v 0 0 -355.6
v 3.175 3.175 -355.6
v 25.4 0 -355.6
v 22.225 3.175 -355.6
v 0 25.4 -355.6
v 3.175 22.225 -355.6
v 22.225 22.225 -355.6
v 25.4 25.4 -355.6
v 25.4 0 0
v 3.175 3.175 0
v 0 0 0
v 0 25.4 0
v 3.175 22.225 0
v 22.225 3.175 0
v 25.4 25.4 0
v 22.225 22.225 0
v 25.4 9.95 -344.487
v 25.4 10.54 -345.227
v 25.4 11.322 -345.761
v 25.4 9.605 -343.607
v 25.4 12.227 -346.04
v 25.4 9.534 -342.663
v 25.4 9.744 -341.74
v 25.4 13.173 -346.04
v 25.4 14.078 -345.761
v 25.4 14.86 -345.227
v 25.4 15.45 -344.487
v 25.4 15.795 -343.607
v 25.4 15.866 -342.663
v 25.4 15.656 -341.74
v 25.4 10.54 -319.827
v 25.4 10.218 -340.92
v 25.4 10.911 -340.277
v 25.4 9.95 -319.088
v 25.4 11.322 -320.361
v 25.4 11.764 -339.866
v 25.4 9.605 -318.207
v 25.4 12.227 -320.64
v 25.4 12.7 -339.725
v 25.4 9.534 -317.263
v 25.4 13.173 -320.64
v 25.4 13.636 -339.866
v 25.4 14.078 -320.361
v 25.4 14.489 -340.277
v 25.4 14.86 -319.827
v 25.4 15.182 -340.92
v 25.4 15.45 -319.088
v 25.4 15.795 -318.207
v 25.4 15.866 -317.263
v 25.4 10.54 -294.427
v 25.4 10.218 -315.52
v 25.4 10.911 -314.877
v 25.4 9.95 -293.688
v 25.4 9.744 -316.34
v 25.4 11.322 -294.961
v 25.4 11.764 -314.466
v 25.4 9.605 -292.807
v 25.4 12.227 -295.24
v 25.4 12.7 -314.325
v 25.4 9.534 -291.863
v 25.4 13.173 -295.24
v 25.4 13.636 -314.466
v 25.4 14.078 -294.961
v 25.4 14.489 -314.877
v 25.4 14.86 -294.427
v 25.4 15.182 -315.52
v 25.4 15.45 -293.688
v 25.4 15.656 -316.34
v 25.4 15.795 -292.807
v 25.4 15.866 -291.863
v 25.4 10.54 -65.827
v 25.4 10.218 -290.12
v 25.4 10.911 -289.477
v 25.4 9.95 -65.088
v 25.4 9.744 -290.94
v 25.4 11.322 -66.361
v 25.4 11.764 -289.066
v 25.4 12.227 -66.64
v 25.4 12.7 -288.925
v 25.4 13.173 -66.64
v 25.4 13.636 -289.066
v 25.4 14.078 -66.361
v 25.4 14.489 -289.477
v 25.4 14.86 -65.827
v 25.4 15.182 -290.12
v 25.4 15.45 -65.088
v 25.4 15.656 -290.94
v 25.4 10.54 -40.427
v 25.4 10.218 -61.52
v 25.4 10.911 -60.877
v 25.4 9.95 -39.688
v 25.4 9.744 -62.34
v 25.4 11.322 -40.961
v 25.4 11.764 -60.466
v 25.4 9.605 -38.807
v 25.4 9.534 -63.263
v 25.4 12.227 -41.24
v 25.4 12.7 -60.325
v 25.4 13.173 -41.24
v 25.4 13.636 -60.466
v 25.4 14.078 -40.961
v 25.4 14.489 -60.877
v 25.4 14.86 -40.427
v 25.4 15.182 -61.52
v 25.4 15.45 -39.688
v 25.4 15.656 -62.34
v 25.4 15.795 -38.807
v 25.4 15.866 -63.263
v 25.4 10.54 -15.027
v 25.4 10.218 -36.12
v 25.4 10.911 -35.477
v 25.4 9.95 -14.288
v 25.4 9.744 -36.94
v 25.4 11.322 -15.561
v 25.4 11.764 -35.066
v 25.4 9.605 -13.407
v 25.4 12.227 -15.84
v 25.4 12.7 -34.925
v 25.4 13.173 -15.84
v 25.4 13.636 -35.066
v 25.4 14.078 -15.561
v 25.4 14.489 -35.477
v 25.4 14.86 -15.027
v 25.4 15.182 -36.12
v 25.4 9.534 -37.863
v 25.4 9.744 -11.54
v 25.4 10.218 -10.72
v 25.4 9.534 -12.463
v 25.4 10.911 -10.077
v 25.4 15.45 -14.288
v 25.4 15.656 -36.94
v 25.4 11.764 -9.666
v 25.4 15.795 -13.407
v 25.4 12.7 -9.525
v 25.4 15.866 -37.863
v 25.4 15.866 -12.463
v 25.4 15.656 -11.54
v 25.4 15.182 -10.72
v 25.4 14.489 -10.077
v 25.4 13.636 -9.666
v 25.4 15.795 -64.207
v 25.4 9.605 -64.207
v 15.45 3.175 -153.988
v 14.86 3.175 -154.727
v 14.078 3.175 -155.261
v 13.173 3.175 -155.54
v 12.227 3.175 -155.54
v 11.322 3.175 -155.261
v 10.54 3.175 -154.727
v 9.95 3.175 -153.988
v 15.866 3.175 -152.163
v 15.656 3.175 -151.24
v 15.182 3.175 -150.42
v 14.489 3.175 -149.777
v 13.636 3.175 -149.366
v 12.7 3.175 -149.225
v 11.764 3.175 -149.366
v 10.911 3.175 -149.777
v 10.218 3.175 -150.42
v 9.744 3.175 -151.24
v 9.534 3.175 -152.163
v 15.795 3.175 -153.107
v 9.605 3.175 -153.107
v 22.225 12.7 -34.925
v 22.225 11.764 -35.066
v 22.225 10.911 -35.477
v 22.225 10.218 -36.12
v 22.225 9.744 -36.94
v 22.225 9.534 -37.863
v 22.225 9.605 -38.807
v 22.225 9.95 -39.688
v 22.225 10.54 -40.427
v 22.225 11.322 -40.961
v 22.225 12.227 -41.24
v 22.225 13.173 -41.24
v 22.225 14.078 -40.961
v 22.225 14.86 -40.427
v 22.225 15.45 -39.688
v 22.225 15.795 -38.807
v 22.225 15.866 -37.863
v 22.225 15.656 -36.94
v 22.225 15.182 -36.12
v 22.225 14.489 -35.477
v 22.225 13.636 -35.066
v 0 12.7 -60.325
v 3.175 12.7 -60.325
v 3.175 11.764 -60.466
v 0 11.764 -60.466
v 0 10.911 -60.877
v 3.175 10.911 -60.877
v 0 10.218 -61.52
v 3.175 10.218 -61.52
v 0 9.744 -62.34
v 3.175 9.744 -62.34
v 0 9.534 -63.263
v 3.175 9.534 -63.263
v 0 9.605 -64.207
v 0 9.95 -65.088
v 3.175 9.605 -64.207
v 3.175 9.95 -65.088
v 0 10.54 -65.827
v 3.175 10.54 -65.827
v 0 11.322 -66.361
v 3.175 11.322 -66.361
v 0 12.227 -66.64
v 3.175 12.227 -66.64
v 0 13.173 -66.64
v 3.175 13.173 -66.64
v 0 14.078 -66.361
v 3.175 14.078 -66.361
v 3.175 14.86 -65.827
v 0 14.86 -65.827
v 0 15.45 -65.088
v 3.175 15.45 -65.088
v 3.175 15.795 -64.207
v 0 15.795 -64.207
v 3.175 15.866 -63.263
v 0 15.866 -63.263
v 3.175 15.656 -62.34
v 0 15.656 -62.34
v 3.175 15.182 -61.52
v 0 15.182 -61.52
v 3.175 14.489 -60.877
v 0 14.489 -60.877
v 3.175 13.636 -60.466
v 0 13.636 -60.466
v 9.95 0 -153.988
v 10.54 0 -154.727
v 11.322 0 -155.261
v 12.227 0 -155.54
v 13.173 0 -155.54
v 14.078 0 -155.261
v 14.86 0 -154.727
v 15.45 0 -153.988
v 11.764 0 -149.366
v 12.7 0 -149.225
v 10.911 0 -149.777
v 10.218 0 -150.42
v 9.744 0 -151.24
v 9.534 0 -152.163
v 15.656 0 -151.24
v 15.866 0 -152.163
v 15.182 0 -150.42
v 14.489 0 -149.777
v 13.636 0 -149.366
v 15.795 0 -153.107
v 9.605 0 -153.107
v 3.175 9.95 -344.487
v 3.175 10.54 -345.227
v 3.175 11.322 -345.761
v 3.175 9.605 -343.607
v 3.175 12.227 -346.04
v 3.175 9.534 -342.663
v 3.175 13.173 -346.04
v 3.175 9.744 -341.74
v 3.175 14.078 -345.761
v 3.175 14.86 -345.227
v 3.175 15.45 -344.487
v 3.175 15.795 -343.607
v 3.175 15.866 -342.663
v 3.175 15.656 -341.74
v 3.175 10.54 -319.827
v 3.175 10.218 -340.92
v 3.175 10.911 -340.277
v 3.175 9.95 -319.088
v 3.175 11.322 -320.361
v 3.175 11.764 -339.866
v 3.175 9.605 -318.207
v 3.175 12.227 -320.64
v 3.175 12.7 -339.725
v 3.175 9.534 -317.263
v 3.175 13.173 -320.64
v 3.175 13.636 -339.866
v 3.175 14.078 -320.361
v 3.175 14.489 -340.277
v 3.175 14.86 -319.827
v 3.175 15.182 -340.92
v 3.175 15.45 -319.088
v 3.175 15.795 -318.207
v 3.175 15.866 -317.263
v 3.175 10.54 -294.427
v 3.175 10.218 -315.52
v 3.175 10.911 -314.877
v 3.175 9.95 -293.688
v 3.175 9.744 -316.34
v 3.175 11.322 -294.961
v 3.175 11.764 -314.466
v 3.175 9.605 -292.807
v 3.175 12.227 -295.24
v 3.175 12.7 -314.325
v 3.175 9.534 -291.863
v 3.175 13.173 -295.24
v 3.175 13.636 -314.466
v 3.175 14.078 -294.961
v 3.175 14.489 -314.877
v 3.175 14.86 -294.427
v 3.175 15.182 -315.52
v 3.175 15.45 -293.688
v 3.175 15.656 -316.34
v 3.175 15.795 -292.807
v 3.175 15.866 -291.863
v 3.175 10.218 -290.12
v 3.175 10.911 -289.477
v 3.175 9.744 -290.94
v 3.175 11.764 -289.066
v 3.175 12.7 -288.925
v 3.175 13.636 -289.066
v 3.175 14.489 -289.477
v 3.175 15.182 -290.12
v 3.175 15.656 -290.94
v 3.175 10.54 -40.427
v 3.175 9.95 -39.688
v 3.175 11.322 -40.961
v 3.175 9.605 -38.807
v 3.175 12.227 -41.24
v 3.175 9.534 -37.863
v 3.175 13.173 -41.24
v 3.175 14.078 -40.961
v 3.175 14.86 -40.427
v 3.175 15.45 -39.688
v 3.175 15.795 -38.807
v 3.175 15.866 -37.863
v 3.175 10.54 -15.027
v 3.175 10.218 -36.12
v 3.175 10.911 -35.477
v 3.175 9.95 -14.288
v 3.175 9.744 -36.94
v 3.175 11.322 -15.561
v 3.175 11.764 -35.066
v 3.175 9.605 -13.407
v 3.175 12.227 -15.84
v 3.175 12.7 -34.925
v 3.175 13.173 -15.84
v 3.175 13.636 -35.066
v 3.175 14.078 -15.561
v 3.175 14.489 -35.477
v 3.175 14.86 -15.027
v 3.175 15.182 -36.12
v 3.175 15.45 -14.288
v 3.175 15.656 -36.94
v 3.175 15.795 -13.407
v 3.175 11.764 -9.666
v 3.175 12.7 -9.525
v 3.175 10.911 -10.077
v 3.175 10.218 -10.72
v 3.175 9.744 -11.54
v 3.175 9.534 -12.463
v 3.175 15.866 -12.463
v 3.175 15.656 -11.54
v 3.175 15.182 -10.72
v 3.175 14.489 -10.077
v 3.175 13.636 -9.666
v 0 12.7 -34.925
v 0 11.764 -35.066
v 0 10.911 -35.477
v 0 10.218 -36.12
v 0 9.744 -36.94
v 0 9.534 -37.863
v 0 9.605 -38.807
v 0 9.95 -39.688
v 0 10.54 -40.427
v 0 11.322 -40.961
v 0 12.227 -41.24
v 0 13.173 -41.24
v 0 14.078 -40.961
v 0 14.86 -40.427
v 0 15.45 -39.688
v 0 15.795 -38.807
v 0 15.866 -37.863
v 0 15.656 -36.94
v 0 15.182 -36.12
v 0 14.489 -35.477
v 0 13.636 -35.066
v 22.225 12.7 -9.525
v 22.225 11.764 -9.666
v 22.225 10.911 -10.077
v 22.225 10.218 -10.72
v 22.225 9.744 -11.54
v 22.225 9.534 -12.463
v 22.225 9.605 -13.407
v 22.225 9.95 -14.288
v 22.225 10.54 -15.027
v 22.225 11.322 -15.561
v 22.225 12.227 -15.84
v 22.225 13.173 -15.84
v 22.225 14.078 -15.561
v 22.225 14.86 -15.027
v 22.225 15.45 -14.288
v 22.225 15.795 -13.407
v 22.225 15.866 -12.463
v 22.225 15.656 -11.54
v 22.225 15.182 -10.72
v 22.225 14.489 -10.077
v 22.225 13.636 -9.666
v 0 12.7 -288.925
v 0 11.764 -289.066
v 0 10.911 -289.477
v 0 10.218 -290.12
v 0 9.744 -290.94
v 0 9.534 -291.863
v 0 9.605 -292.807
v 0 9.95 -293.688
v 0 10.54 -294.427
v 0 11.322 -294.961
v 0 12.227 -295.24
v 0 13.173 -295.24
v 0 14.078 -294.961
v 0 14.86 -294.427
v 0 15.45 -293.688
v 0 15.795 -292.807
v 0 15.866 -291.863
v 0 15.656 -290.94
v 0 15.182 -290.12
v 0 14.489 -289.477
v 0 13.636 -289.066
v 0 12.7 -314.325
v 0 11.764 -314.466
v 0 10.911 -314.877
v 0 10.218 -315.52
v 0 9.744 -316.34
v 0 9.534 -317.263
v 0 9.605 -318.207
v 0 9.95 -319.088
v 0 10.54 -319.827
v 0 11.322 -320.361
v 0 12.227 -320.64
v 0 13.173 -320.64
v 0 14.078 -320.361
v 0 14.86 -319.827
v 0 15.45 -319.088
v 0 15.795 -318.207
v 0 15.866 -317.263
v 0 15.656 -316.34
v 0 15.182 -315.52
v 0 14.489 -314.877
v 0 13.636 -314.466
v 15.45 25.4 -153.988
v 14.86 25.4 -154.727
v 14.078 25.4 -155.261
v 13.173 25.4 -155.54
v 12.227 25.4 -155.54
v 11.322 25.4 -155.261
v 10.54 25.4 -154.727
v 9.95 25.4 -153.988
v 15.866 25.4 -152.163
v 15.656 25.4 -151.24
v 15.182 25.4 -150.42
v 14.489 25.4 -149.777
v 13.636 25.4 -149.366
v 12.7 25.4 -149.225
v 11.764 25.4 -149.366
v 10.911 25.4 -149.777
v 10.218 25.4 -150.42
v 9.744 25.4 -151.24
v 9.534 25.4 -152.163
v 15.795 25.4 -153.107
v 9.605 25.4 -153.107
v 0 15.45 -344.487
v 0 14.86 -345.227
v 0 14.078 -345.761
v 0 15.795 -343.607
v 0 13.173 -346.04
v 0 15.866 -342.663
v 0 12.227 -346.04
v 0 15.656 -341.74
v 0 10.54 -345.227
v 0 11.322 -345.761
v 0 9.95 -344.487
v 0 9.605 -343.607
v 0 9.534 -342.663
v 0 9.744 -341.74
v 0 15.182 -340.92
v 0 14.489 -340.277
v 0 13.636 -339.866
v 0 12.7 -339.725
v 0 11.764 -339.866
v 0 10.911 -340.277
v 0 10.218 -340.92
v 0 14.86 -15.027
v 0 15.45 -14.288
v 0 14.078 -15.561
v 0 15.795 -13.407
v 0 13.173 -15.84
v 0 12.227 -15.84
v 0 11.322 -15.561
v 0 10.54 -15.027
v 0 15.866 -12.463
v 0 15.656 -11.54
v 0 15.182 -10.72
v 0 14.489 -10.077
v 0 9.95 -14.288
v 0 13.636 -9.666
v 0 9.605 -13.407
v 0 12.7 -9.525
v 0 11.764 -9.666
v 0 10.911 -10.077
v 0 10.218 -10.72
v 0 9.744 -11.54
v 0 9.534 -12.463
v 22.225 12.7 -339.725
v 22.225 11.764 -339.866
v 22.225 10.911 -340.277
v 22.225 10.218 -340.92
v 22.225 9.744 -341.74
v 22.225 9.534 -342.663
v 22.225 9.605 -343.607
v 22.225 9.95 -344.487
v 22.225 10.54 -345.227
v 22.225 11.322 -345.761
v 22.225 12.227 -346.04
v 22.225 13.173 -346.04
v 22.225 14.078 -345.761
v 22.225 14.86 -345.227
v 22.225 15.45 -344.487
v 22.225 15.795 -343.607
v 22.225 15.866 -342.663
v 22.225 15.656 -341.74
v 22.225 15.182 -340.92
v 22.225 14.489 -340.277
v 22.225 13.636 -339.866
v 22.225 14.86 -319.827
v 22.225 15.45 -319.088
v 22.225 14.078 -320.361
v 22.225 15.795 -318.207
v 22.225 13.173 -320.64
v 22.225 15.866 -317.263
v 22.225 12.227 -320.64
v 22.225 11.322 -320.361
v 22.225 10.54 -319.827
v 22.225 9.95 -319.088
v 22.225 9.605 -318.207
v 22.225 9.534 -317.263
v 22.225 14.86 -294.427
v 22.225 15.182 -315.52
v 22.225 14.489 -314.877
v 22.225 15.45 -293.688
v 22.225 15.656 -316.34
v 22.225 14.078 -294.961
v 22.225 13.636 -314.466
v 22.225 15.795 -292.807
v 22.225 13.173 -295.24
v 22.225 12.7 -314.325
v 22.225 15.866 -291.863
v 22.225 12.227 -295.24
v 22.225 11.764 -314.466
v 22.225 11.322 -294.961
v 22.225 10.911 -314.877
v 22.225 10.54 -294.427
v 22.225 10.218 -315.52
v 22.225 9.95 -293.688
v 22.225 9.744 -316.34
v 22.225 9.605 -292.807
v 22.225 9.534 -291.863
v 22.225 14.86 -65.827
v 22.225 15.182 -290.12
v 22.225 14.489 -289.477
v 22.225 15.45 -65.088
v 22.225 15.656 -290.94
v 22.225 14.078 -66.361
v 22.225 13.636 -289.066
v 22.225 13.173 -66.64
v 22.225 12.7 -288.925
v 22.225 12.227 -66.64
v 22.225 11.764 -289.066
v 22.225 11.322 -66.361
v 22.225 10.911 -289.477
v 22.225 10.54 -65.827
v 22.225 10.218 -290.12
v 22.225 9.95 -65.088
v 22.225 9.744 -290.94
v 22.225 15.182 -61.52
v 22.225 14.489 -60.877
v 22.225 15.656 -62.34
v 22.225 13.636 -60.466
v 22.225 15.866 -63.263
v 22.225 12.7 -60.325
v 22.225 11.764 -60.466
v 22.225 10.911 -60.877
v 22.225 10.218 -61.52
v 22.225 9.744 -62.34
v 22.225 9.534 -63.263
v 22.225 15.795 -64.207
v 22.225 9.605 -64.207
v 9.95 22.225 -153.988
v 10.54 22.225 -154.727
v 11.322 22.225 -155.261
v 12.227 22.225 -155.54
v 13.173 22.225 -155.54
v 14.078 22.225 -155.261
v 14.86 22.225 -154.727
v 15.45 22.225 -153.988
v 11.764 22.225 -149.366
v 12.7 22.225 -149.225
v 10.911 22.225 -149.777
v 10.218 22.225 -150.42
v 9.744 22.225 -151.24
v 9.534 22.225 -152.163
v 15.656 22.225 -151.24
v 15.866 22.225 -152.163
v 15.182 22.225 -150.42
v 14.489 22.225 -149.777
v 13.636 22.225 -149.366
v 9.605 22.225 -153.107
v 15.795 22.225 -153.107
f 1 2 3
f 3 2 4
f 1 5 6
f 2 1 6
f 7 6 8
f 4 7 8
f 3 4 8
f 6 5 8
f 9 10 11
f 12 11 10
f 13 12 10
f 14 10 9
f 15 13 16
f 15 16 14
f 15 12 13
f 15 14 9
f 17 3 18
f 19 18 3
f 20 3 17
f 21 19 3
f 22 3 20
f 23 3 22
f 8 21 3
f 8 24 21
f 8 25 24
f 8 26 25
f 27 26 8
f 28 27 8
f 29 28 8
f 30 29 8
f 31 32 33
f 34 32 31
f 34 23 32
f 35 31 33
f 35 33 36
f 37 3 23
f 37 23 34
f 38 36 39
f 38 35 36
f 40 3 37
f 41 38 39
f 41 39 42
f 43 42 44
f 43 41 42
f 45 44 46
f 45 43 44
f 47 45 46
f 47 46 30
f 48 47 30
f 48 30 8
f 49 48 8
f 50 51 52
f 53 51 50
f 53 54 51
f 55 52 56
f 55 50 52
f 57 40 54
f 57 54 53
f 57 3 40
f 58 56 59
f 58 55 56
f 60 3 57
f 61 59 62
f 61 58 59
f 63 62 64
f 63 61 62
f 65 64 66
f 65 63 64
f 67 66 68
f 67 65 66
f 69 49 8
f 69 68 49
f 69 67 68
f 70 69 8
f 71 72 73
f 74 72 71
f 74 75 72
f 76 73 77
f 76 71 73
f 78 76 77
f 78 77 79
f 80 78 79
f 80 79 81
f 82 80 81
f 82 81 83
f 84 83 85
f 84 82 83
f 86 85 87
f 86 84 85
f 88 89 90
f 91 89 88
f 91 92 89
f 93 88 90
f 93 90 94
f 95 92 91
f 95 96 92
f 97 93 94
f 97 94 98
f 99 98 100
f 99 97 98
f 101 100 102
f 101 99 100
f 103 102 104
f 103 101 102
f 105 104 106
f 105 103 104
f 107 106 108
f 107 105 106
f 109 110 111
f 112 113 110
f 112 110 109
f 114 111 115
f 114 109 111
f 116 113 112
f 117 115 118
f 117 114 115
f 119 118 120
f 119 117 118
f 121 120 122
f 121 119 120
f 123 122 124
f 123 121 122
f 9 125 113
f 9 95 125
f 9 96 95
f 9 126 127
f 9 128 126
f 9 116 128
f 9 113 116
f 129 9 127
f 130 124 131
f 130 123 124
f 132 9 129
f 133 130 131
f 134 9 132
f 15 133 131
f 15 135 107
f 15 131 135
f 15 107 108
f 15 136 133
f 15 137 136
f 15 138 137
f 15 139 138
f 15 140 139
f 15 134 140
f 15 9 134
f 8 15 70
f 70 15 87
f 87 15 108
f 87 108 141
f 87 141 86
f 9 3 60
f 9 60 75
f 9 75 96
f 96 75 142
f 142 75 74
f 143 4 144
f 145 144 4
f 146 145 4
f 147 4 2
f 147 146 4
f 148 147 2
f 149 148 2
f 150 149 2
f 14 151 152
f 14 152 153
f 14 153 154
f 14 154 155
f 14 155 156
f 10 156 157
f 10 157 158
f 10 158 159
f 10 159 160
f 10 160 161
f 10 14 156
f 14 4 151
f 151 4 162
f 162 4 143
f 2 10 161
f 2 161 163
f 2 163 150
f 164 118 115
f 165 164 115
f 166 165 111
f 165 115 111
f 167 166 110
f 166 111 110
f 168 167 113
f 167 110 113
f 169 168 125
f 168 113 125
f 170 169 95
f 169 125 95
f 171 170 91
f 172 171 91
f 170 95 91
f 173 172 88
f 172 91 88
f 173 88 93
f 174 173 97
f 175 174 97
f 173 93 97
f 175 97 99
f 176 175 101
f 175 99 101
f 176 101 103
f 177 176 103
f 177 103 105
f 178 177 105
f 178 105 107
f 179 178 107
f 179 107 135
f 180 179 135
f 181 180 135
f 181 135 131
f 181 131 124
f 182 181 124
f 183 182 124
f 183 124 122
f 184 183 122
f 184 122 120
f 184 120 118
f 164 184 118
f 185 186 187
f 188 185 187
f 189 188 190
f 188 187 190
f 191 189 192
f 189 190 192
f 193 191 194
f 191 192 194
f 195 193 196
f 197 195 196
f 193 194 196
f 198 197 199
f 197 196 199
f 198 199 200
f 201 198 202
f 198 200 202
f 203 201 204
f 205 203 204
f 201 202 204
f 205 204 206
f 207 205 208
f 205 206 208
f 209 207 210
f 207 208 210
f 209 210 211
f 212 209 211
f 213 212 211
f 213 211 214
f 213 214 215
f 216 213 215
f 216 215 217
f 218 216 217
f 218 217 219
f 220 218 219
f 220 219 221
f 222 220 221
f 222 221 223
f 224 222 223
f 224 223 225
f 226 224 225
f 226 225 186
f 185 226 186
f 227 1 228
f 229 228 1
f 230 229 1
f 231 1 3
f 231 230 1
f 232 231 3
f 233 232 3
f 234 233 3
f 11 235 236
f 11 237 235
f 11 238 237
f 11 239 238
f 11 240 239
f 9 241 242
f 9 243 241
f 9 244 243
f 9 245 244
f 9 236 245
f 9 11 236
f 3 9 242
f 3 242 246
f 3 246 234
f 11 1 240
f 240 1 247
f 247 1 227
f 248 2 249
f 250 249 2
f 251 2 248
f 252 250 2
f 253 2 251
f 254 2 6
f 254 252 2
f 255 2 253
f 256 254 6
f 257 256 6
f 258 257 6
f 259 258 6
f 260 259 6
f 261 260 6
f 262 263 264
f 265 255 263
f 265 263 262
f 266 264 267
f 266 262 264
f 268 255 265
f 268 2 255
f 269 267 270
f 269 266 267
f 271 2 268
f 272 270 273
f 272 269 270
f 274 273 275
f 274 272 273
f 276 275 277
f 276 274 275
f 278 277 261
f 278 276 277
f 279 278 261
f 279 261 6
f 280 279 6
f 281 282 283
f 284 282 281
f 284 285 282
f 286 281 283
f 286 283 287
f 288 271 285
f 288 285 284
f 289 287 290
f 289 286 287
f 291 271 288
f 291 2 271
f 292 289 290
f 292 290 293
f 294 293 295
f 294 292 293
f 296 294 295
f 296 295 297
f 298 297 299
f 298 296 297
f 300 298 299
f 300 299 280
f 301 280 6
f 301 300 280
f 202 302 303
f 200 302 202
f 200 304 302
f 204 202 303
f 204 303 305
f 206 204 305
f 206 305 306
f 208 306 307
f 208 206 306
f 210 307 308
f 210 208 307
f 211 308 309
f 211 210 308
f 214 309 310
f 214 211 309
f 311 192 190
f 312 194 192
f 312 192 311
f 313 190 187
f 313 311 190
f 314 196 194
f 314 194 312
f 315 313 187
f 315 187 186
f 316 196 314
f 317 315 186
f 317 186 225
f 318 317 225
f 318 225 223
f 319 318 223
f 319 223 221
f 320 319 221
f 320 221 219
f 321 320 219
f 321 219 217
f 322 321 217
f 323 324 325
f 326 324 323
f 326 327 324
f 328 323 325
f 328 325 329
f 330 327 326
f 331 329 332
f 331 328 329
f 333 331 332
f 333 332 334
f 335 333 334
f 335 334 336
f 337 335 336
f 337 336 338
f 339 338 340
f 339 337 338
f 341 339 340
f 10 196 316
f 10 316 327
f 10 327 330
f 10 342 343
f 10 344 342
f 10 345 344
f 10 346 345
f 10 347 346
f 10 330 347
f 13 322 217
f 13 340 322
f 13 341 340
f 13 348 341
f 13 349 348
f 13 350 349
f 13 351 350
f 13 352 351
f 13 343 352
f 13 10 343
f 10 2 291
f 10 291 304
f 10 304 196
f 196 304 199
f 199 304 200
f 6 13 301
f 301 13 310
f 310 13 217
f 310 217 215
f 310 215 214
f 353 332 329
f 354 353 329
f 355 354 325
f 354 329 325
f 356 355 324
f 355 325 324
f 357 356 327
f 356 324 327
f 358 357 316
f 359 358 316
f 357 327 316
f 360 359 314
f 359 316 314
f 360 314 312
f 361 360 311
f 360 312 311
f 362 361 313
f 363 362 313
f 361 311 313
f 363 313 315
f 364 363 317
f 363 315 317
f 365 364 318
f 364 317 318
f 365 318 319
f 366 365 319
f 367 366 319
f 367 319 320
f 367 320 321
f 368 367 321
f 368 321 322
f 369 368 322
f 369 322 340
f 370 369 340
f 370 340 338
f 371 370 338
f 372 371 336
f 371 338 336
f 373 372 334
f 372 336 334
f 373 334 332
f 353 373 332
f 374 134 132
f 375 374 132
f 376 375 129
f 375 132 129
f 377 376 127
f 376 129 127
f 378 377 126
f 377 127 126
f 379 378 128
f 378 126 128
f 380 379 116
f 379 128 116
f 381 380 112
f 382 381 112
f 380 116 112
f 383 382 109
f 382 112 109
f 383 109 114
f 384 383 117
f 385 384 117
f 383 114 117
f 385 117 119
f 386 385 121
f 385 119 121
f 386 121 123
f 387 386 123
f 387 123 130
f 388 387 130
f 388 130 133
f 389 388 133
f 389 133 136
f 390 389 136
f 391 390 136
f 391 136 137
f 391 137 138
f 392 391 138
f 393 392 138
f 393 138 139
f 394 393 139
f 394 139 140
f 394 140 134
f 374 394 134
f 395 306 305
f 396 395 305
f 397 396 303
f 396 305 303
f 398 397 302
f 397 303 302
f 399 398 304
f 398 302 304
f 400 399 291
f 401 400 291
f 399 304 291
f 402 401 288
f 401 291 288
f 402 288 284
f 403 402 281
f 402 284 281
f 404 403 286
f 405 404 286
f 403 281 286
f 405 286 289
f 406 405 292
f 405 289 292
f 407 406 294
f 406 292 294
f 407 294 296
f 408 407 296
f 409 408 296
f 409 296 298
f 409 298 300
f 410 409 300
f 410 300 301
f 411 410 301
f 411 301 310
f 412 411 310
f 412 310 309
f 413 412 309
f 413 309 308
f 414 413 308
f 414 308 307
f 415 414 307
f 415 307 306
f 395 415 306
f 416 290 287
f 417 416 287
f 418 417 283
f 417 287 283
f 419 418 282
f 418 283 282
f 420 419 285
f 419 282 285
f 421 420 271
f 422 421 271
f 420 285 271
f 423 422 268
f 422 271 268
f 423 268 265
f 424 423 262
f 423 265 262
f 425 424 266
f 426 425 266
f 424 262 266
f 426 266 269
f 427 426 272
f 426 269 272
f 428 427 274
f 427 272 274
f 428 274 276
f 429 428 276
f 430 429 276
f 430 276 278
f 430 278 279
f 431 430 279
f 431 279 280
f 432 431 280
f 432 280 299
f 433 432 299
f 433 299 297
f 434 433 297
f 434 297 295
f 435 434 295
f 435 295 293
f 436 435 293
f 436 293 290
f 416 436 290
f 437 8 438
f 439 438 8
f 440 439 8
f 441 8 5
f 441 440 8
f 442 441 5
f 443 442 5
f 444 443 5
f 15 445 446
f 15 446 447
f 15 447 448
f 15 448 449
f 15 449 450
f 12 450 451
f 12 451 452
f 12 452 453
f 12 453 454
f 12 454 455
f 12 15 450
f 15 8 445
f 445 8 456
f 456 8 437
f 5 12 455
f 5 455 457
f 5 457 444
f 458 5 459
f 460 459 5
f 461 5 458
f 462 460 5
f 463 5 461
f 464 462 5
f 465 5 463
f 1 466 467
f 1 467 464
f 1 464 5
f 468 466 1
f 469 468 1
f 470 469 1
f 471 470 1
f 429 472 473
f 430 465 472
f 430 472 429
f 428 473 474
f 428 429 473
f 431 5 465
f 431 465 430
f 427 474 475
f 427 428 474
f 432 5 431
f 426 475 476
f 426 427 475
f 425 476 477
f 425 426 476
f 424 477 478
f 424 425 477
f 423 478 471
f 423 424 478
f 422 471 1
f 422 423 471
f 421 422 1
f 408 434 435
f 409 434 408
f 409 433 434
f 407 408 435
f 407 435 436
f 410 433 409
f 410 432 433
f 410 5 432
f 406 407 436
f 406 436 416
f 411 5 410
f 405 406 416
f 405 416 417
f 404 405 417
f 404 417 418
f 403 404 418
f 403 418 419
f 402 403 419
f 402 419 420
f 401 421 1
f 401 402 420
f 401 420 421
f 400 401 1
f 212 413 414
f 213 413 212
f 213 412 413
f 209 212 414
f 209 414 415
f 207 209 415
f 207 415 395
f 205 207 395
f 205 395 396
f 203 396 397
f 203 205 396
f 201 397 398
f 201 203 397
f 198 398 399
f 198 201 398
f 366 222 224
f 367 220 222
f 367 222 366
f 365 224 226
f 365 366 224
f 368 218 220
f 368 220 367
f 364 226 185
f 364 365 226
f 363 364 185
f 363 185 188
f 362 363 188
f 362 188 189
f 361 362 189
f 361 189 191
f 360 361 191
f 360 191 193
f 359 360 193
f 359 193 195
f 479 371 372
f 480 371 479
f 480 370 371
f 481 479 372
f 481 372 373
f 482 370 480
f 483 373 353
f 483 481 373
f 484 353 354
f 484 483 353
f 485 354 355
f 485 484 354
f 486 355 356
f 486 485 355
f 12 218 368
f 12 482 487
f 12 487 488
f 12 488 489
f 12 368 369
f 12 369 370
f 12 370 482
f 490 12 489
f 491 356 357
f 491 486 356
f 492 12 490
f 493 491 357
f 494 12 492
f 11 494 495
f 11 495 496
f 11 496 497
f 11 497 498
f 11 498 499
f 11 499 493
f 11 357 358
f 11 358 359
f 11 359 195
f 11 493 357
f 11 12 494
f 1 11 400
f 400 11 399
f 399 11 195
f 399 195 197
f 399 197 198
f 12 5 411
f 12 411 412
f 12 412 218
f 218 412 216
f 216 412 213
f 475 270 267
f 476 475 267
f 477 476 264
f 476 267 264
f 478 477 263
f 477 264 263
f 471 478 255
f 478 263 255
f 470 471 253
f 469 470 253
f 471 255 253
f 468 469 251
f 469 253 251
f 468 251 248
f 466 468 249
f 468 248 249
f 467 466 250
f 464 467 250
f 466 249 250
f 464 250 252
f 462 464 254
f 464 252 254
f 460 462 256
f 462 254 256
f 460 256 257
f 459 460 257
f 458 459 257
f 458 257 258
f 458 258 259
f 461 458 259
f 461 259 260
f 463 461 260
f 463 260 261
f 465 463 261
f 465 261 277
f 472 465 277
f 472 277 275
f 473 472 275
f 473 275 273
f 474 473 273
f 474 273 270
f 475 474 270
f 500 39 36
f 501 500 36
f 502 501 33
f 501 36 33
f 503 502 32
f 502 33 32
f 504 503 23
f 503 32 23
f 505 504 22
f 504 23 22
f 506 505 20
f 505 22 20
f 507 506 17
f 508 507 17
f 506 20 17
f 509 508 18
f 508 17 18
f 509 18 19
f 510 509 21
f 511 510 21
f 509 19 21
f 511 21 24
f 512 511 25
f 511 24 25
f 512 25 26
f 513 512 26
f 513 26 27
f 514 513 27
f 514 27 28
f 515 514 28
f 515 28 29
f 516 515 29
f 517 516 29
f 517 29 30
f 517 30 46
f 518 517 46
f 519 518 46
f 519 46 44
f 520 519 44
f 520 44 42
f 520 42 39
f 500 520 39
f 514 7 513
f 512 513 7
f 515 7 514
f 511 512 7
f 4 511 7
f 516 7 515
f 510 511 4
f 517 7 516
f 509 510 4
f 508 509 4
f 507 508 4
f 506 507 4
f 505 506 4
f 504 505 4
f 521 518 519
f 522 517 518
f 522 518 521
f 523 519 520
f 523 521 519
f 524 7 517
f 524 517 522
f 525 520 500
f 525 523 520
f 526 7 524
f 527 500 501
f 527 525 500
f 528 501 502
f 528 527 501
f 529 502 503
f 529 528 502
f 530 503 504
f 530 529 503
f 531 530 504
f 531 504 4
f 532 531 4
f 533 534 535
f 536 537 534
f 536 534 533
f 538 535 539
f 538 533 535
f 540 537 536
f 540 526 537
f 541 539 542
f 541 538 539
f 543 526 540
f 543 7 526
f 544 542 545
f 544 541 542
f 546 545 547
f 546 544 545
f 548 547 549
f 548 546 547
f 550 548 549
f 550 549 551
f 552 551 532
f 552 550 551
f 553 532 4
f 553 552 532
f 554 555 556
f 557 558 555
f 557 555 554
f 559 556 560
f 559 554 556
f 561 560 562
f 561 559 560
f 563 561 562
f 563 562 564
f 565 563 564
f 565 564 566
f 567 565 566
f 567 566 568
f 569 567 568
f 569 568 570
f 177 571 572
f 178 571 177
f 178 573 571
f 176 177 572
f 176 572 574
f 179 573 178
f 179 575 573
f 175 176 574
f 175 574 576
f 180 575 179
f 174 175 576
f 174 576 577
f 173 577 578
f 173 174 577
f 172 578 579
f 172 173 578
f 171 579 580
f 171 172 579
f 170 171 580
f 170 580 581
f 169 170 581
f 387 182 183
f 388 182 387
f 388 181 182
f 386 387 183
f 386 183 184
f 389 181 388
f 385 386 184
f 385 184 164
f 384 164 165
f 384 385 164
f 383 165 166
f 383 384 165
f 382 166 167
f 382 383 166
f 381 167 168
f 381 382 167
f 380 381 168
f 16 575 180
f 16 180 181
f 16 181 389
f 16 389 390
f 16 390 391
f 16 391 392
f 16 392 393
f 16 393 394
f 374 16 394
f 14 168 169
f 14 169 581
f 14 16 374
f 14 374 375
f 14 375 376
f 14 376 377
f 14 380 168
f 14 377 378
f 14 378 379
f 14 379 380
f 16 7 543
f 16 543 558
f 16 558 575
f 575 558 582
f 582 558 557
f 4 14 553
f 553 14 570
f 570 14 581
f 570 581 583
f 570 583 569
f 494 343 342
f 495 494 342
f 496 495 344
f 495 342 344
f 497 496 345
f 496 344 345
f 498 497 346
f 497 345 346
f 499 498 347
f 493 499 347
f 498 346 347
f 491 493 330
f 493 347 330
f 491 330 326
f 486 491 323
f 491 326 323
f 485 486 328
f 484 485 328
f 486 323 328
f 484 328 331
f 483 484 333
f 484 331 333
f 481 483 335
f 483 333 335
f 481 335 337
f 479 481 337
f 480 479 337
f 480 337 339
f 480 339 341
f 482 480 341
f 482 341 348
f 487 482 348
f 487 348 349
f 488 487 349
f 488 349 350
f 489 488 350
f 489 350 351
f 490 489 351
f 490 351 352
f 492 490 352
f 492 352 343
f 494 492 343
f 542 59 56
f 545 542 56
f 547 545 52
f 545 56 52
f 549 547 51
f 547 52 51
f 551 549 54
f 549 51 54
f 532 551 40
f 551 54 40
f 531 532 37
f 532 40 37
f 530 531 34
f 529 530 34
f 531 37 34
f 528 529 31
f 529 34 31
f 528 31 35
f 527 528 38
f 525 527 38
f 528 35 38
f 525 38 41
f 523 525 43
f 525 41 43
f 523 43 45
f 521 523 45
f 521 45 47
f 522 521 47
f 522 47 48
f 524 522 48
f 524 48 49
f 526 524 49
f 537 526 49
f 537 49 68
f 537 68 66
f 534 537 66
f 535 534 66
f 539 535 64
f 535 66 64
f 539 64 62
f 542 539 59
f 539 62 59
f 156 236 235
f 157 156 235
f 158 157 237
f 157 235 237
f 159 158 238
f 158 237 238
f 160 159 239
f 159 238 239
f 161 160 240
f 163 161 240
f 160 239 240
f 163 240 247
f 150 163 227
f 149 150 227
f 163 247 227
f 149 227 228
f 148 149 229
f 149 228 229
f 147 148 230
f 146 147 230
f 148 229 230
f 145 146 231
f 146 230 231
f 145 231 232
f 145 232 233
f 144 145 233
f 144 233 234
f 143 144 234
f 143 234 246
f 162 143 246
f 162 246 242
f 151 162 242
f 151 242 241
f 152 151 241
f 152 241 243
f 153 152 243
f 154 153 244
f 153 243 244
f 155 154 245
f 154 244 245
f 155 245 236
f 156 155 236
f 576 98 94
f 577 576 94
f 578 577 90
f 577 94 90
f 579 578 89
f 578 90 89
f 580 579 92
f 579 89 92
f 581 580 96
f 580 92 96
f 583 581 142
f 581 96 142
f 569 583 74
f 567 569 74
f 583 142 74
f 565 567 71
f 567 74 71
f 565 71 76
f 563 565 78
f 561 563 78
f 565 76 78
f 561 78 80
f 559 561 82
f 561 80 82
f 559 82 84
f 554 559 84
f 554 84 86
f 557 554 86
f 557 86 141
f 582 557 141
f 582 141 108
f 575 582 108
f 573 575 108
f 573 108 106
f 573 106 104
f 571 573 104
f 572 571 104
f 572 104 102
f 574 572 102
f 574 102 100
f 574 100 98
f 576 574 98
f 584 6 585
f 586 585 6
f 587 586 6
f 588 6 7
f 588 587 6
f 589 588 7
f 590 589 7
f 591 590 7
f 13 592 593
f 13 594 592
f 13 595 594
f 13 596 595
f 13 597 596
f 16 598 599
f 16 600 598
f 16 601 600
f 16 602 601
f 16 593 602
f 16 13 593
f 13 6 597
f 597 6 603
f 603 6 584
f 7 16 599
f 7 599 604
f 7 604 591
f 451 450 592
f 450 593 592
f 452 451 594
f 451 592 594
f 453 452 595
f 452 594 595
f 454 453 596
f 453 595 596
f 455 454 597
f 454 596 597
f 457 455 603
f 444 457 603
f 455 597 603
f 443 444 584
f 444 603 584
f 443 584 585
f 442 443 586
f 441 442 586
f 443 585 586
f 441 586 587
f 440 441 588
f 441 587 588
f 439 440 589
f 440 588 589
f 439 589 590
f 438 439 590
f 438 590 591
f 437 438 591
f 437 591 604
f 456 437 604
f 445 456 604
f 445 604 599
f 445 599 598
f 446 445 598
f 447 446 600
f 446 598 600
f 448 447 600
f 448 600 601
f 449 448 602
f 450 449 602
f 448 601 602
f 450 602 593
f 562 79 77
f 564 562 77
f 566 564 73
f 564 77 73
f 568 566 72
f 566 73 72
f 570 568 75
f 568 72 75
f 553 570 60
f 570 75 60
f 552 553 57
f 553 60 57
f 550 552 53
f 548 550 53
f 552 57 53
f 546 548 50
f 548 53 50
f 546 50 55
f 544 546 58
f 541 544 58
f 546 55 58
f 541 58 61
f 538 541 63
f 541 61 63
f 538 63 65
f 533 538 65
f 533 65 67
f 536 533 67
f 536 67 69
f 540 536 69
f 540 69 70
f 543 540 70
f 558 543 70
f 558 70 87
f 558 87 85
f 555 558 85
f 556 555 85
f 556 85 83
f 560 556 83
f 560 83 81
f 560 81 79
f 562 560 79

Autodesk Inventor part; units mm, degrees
ref_plane "YZ Plane" through (0, 0, 0) normal (1, 0, 0) x (0, 1, 0)
ref_plane "XZ Plane" through (0, 0, 0) normal (0, 1, 0) x (-1, 0, 0)
ref_plane "XY Plane" through (0, 0, 0) normal (0, 0, 1) x (1, 0, 0)
sketch "Sketch1" plane through (0, 0, 0) normal (0, 0, 1) x (1, 0, 0)
  line L0 (0, 0) -> (25.4, 0)
  line L1 (25.4, 0) -> (25.4, 25.4)
  line L2 (25.4, 25.4) -> (0, 25.4)
  line L3 (0, 25.4) -> (0, 0)
  line L4 (3.175, 22.225) -> (22.225, 22.225)
  line L5 (22.225, 22.225) -> (22.225, 3.175)
  line L6 (22.225, 3.175) -> (3.175, 3.175)
  line L7 (3.175, 3.175) -> (3.175, 22.225)
  dimension "d0" = 25.4
  dimension "d1" = 25.4
  dimension "d2" = 3.175
extrude "Extrusion1" add sketch "Sketch1" against normal blind 355.6
sketch "Sketch2" plane through (0, 0, 0) normal (-1, 0, 0) x (0, 0, 1)
  line L0 (0, 25.4) -> (-355.6, 25.4) projected
  line L1 (0, 25.4) -> (0, 0) projected
  point P0 (-317.5, 12.7)
  point P1 (-292.1, 12.7)
  point P2 (-12.7, 12.7)
  point P3 (-38.1, 12.7)
  point P4 (-63.5, 12.7)
  point P5 (-317.5, 12.7)
  point P6 (-342.9, 12.7)
  dimension "d6" = 25.4
  dimension "d7" = 12.7
  dimension "d24" = 12.7
  dimension "d25" = 25.4
  dimension "d26" = 25.4
  dimension "d27" = 25.4
  dimension "d31" = 25.4
  dimension "d32" = 228.6
hole "Hole1" at (0, 12.7, -317.5) at (0, 12.7, -292.1) at (0, 12.7, -38.1) at (0, 12.7, -12.7) at (0, 12.7, -63.5) at (0, 12.7, -342.9) direction (1, 0, 0) diameter 6.35 depth 25.4 tip angle 118
sketch "Sketch5" plane through (0, 25.4, 0) normal (0, 1, 0) x (1, 0, 0)
  line L0 (25.4, 0) -> (0, 0) projected
  point P0 (12.7, 152.4)
  dimension "d34" = 152.4
hole "Hole3" at (12.7, 25.4, -152.4) direction (0, -1, 0) diameter 6.35 depth 25.4 tip angle 118
properties part number "towermiddleunderthing"
